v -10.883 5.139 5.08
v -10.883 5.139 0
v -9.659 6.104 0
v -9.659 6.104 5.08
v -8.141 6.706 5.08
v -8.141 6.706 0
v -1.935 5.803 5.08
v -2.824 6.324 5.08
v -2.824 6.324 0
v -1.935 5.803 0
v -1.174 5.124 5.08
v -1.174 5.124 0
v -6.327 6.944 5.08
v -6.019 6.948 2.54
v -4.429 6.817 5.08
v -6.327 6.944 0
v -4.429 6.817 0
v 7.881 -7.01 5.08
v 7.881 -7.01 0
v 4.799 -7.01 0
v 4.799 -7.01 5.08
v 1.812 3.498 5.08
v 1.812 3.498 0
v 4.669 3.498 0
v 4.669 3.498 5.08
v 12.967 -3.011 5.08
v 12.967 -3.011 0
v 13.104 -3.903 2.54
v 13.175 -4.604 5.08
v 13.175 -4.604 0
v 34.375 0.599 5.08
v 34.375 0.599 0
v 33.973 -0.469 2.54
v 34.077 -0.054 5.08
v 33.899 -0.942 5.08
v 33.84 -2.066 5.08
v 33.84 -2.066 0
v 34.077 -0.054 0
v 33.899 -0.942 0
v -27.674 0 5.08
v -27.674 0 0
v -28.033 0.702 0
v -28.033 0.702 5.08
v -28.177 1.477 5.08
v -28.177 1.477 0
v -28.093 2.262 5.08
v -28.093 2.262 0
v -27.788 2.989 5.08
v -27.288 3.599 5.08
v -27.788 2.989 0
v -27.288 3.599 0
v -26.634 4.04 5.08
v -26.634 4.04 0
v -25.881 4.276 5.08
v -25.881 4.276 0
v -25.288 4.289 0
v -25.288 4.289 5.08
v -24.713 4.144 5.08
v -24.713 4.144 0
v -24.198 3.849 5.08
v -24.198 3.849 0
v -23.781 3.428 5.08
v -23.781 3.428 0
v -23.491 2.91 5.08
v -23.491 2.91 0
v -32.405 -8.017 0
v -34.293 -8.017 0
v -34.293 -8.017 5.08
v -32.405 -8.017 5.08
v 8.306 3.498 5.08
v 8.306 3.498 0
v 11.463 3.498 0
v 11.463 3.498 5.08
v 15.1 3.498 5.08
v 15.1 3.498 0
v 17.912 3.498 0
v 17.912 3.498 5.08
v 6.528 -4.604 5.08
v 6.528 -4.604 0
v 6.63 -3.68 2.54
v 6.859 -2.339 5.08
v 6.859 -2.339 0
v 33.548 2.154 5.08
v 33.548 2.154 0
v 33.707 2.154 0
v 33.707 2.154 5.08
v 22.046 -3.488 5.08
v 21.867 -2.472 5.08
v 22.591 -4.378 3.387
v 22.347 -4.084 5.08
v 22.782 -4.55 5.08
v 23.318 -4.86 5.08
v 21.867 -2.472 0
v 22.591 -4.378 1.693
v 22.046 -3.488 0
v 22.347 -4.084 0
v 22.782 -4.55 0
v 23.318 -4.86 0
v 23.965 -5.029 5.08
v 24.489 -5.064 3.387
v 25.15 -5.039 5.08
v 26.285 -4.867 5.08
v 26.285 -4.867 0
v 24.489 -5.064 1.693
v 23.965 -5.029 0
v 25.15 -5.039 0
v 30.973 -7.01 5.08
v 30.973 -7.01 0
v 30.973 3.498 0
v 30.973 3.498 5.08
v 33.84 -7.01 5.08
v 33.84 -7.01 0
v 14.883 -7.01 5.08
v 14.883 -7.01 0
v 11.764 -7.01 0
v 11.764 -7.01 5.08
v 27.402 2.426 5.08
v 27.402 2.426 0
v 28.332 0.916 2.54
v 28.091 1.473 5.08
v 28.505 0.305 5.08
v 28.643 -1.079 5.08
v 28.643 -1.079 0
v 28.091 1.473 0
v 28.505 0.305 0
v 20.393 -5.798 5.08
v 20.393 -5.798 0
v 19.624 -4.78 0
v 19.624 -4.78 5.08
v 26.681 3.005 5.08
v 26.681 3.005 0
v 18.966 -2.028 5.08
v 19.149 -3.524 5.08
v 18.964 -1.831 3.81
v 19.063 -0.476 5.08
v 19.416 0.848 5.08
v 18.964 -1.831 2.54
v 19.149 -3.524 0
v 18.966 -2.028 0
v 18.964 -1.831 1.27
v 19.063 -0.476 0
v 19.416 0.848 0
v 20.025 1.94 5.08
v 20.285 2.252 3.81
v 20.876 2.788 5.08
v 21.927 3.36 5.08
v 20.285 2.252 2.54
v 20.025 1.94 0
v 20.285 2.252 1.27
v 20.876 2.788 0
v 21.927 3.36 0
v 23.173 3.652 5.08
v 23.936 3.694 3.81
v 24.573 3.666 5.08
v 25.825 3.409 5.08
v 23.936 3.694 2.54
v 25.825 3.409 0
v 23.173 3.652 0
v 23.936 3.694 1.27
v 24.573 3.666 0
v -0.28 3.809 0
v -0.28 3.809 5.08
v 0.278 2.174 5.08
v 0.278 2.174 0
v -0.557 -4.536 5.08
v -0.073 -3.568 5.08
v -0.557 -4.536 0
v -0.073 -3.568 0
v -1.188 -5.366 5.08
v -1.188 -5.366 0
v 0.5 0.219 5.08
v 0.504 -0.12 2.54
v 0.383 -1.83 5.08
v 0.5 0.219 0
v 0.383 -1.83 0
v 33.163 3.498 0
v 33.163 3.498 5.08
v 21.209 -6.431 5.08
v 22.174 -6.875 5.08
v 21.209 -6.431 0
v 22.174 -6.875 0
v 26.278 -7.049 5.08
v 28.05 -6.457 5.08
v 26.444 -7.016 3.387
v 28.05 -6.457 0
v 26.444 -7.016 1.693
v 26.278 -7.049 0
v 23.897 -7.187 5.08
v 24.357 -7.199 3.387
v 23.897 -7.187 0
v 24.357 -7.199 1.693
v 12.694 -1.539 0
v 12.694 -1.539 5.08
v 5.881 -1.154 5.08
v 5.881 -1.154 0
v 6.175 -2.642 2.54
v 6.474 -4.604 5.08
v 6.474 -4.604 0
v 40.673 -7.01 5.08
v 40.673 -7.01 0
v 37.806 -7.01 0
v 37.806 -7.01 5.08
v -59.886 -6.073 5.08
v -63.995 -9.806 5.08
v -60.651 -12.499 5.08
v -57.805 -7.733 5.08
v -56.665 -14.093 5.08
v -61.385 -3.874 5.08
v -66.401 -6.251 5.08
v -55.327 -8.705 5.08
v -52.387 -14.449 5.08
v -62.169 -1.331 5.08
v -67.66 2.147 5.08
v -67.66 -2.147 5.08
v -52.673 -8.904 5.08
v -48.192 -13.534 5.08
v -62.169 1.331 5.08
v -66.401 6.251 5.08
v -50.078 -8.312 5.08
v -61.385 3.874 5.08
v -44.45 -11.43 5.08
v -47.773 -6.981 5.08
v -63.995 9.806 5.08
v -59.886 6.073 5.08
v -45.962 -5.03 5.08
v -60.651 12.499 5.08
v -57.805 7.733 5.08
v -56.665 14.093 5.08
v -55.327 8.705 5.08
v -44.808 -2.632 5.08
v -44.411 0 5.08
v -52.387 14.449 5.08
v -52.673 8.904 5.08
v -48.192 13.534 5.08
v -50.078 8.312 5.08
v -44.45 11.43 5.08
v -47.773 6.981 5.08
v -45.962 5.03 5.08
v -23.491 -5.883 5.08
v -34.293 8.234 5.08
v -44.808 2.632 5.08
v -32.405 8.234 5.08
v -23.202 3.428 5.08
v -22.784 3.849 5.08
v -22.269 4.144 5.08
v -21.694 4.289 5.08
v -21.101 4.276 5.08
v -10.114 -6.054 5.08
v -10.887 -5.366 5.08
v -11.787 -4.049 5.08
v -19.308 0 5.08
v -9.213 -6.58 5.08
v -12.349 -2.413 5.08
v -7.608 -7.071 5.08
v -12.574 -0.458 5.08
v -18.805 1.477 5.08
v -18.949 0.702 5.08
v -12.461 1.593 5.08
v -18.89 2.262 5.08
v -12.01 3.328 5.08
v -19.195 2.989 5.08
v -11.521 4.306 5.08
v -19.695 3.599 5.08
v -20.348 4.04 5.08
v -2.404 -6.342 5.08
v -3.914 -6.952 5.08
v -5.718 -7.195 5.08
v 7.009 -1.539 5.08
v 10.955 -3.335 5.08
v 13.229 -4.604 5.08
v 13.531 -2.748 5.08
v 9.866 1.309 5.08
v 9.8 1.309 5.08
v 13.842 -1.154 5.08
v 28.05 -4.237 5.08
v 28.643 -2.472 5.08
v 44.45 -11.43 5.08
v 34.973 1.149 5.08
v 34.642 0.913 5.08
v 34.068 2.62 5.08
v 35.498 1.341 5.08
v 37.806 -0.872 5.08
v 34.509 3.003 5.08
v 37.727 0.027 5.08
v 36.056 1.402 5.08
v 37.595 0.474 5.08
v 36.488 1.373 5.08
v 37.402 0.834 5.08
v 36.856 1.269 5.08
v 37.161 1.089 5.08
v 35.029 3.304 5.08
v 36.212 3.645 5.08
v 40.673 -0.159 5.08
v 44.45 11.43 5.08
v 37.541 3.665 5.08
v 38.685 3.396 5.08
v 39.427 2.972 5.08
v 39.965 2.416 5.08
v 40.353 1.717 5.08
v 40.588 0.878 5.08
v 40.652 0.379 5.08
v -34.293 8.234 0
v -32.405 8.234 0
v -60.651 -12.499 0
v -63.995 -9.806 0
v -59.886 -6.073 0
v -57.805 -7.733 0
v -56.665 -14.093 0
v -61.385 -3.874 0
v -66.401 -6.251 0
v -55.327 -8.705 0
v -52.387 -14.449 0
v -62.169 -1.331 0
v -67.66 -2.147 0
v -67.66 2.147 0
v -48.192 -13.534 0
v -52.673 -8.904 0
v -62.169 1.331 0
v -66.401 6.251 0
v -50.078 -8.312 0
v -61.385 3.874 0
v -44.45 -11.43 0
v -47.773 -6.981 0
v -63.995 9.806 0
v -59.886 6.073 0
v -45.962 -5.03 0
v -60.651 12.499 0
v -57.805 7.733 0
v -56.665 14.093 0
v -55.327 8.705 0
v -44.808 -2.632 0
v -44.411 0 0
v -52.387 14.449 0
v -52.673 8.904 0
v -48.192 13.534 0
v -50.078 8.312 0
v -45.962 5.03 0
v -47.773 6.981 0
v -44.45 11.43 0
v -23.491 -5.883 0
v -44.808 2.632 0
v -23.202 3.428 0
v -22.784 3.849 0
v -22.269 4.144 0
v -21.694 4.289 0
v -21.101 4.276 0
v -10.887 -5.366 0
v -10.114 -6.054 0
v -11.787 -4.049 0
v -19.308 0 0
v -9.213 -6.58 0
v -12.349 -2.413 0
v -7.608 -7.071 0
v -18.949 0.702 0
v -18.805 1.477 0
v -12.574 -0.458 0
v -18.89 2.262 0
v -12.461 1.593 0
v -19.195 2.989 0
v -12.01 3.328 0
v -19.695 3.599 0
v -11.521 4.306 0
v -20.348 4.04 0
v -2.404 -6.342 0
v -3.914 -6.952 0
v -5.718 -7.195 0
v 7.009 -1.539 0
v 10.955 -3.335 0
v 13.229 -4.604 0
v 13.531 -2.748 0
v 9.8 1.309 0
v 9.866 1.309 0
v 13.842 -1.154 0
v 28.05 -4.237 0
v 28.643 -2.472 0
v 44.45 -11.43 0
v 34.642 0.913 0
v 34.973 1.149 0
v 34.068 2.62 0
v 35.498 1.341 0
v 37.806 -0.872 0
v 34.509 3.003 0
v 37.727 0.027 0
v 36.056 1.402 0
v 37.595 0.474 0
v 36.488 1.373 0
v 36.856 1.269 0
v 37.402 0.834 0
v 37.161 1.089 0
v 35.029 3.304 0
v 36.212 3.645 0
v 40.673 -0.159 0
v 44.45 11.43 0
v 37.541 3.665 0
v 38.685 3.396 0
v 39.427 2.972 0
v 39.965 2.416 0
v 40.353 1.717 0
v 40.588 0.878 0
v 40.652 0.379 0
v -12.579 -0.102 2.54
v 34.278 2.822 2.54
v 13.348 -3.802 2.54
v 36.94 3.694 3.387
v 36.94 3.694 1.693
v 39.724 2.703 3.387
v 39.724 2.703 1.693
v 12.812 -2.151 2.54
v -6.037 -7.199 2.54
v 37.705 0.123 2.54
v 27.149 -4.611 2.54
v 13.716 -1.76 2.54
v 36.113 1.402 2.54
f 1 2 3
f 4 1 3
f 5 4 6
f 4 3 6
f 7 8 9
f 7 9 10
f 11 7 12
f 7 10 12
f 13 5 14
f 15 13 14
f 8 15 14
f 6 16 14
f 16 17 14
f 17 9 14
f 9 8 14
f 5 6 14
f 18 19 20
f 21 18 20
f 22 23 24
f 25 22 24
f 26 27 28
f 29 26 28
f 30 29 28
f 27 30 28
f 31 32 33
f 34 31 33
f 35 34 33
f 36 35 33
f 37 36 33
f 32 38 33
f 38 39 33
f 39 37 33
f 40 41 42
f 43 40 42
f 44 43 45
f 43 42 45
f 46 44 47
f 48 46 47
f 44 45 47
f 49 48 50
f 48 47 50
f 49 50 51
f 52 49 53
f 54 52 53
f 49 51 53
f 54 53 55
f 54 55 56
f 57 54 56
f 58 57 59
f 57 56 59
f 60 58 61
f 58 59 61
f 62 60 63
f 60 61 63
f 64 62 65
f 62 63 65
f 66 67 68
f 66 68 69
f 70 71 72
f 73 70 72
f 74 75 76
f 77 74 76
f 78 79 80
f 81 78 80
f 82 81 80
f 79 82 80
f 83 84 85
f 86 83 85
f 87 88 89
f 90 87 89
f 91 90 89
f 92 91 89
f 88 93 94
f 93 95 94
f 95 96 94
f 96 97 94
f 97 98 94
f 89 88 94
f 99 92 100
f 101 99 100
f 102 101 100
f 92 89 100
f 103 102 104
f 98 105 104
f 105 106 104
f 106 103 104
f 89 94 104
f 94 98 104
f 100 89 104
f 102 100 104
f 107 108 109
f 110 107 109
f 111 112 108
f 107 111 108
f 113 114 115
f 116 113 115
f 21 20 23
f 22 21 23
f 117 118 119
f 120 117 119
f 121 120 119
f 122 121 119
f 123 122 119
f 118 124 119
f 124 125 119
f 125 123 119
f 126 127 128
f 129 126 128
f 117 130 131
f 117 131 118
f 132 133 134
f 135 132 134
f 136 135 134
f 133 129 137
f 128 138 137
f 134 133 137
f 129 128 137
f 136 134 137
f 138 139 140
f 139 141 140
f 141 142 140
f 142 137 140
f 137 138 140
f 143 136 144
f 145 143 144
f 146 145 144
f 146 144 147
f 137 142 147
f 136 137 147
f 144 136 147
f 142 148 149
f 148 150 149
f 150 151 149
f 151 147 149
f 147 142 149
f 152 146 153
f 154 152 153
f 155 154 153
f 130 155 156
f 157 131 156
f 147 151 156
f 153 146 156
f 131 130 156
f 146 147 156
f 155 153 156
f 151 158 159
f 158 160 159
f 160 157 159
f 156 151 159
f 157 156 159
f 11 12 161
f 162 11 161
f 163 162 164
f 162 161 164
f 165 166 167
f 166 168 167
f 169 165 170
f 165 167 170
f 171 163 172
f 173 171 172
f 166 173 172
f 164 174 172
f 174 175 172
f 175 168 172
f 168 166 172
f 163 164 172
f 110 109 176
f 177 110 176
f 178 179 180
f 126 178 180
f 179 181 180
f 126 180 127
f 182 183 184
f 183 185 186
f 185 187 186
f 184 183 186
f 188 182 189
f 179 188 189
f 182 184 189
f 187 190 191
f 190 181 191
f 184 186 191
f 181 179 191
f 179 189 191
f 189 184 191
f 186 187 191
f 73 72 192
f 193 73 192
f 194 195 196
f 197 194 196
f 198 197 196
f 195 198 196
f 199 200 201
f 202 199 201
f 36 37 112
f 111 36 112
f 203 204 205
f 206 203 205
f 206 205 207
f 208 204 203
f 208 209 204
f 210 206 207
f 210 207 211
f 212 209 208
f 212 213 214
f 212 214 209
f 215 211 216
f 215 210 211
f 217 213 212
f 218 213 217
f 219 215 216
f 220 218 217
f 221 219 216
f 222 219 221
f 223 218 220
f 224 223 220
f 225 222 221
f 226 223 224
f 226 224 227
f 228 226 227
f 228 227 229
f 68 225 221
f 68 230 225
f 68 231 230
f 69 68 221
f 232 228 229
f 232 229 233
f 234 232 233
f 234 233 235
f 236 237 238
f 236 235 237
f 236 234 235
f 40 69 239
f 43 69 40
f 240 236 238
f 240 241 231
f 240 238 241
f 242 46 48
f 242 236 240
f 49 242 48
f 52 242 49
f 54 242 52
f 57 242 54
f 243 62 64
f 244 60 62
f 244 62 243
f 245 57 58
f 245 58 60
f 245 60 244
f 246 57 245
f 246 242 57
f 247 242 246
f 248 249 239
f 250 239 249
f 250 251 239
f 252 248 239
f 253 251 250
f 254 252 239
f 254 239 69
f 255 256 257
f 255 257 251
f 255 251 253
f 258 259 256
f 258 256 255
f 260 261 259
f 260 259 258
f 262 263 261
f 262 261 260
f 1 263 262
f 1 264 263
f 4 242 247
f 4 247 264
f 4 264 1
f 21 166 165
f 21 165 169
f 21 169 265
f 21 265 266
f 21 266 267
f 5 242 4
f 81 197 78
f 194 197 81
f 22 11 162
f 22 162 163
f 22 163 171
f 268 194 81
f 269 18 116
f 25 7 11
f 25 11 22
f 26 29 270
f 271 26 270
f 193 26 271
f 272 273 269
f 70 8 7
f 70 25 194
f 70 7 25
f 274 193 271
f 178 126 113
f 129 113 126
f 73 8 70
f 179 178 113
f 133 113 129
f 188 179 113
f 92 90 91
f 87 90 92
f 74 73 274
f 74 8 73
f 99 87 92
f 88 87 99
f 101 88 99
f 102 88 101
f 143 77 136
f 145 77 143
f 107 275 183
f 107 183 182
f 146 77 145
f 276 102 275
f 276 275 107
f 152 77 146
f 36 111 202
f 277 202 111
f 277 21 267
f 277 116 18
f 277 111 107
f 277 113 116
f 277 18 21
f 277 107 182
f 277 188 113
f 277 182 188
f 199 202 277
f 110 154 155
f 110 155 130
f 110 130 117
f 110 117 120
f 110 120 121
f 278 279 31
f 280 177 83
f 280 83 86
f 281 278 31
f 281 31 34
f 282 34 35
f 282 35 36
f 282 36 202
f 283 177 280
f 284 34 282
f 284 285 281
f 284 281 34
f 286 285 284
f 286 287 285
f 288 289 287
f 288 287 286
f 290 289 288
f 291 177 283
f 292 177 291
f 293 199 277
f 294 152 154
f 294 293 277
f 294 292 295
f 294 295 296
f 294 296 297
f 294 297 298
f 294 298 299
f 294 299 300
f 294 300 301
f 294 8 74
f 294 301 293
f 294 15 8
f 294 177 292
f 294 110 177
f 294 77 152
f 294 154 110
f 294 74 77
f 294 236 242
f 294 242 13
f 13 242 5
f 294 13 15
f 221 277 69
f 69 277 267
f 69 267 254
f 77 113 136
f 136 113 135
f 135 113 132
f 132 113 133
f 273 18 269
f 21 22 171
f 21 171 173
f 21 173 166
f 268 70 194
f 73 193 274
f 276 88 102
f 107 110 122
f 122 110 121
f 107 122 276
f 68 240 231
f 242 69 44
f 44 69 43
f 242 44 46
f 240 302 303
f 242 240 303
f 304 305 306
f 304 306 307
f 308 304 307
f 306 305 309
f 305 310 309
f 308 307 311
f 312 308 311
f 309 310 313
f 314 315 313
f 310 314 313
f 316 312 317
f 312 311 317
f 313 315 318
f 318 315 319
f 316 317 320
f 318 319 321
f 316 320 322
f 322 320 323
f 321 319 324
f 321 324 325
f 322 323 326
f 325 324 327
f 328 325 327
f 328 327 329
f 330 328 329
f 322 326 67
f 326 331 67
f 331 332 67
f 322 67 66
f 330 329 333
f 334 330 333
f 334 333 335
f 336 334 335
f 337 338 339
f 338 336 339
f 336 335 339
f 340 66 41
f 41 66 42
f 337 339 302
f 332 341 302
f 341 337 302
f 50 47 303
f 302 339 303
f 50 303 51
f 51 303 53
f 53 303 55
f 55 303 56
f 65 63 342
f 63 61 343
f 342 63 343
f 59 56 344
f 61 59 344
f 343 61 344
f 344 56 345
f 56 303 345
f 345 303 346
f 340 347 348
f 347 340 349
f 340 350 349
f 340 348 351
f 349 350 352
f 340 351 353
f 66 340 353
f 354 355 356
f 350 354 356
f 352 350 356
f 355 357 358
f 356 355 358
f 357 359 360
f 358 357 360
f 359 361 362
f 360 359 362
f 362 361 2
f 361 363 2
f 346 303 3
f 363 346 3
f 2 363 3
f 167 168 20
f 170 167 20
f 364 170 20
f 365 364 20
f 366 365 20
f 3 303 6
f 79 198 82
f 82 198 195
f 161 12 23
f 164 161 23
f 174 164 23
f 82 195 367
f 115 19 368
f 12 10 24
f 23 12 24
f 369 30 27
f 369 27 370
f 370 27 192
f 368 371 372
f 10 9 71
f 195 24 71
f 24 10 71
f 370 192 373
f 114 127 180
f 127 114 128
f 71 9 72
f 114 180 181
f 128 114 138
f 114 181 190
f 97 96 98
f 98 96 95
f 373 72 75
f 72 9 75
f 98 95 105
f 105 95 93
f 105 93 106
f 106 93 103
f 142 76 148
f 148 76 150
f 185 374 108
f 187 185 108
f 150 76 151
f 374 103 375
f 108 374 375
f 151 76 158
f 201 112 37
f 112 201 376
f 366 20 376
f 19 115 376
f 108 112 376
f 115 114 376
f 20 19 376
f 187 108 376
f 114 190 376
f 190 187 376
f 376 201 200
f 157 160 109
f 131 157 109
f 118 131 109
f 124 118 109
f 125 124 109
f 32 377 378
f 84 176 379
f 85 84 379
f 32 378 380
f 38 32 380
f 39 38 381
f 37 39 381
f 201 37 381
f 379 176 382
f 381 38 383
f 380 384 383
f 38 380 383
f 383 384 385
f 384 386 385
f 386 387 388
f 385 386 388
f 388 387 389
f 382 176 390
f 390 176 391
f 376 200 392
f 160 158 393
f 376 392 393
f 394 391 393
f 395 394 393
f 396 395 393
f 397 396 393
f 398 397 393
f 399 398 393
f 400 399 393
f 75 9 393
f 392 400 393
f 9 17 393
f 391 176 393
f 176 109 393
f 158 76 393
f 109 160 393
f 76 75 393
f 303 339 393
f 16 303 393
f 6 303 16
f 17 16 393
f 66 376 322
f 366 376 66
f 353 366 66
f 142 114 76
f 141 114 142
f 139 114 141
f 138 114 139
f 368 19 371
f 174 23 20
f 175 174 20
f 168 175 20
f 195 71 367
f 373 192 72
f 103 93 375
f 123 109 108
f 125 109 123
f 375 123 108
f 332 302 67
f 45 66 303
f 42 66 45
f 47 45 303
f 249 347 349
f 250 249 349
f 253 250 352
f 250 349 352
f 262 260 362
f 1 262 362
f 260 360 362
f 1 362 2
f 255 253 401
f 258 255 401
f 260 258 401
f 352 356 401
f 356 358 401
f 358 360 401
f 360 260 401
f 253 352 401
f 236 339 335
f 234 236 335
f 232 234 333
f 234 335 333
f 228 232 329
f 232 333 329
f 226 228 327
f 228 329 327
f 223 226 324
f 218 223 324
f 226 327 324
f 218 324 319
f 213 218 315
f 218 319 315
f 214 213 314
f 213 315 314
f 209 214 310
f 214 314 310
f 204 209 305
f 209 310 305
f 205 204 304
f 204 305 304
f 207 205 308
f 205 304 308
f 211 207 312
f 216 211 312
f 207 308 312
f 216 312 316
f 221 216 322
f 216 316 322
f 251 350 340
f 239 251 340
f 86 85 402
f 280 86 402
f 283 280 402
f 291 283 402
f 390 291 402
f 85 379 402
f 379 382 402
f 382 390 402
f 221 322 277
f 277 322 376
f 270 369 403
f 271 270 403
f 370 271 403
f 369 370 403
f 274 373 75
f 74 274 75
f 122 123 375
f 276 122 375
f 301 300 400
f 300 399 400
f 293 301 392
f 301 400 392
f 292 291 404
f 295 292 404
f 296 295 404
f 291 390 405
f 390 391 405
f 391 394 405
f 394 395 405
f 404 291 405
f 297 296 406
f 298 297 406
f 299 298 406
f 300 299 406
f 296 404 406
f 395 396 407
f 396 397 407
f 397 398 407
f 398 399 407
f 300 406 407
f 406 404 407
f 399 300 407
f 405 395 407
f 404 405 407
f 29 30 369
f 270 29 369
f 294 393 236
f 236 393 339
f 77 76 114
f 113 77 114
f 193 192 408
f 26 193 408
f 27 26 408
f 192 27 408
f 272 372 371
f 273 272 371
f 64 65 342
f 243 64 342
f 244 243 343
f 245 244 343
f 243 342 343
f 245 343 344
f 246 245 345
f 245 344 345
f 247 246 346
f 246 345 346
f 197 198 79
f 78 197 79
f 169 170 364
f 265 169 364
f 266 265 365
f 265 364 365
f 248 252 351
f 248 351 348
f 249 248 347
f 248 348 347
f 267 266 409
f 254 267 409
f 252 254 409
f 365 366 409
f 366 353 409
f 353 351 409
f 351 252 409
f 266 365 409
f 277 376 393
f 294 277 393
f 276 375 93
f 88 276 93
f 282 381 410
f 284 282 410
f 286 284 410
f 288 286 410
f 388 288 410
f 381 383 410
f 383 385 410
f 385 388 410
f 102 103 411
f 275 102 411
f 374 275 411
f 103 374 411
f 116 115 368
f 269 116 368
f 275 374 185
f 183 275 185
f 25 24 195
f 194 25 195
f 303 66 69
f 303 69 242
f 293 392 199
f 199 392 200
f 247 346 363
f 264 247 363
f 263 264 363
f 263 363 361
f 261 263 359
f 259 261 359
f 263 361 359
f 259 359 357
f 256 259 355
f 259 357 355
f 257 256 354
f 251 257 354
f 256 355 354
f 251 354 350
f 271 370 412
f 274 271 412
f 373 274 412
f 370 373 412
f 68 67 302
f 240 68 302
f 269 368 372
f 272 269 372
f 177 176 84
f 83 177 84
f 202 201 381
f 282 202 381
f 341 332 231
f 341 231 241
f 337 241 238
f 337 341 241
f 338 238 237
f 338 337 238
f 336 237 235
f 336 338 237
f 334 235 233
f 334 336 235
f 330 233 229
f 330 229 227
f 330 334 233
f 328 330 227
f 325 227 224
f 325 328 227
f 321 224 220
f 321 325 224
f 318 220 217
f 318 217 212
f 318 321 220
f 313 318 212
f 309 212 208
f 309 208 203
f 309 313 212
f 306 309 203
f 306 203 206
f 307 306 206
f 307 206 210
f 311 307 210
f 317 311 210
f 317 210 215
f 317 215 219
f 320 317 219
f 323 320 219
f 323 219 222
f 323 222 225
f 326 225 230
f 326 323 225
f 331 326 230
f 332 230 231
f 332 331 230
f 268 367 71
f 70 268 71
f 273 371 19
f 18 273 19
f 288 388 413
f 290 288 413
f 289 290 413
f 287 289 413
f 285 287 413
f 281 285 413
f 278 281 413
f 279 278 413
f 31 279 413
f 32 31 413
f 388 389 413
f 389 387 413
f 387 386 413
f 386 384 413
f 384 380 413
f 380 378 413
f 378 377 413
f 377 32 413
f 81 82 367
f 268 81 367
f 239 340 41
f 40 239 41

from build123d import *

# Parameters (mm, degrees)
F0_R     = 8.9291855446
F0_W     = 1.8887050901
F0_H     = 16.251400295
F1_DEPTH = 5.08


with BuildPart() as f1:
    # F0 (on Top) → F1 (new body)
    with BuildSketch(Plane.XY):
        with BuildLine():
            Line((44.45, -11.43), (44.45, 11.43))
            Line((44.45, 11.43), (-44.45, 11.43))
            ThreePointArc((-44.45, 11.43), (-67.8202265578, 0), (-44.45, -11.43))
            Line((-44.45, -11.43), (44.45, -11.43))
        make_face()
        with BuildLine():
            Line((-19.3083044142, 0), (-23.491198197, -5.8829421178))
            Line((-23.491198197, -5.8829421178), (-27.6740919799, 0))
            ThreePointArc((-27.6740919799, 0), (-27.9666728456, 2.6362555137), (-25.8814226836, 4.2755170725))
            ThreePointArc((-25.8814226836, 4.2755170725), (-24.4455751804, 4.0138821459), (-23.491198197, 2.9096740764))
            ThreePointArc((-23.491198197, 2.9096740764), (-22.5368212136, 4.0138821459), (-21.1009737104, 4.2755170725))
            ThreePointArc((-21.1009737104, 4.2755170725), (-19.0157235484, 2.6362555137), (-19.3083044142, 0))
        make_face(mode=Mode.SUBTRACT)
        with BuildLine():
            add(Edge.make_bspline(
                [(-1.1741983702, 5.1239690358), (0.5040073817, 3.2998977303), (0.5040073817, -0.1196720545)],
                knots=[0, 0, 0, 1, 1, 1], degree=2))
            add(Edge.make_bspline(
                [(0.5040073817, -0.1196720545), (0.5040073817, -3.5332267649), (-1.1877322875, -5.366320682)],
                knots=[0, 0, 0, 1, 1, 1], degree=2))
            add(Edge.make_bspline(
                [(-1.1877322875, -5.366320682), (-2.8794719568, -7.1994145992), (-6.037386006, -7.1994145992)],
                knots=[0, 0, 0, 1, 1, 1], degree=2))
            add(Edge.make_bspline(
                [(-6.037386006, -7.1994145992), (-9.1953000553, -7.1994145992), (-10.8870397245, -5.366320682)],
                knots=[0, 0, 0, 1, 1, 1], degree=2))
            add(Edge.make_bspline(
                [(-10.8870397245, -5.366320682), (-12.5787793938, -3.5332267649), (-12.5787793938, -0.1016268314)],
                knots=[0, 0, 0, 1, 1, 1], degree=2))
            add(Edge.make_bspline(
                [(-12.5787793938, -0.1016268314), (-12.5787793938, 3.3299731022), (-10.8825284187, 5.1390067218)],
                knots=[0, 0, 0, 1, 1, 1], degree=2))
            add(Edge.make_bspline(
                [(-10.8825284187, 5.1390067218), (-9.1862774437, 6.9480403414), (-6.0193407829, 6.9480403414)],
                knots=[0, 0, 0, 1, 1, 1], degree=2))
            add(Edge.make_bspline(
                [(-6.0193407829, 6.9480403414), (-2.8524041221, 6.9480403414), (-1.1741983702, 5.1239690358)],
                knots=[0, 0, 0, 1, 1, 1], degree=2))
        make_face(mode=Mode.SUBTRACT)
        with BuildLine():
            Line((14.883042686, -7.0099397562), (11.7642266202, -7.0099397562))
            Line((11.7642266202, -7.0099397562), (10.9551991161, -3.3347293104))
            Line((10.9551991161, -3.3347293104), (9.8664706534, 1.3089081106))
            Line((9.8664706534, 1.3089081106), (9.8003048353, 1.3089081106))
            Line((9.8003048353, 1.3089081106), (7.8814961082, -7.0099397562))
            Line((7.8814961082, -7.0099397562), (4.7987704887, -7.0099397562))
            Line((4.7987704887, -7.0099397562), (1.8122860592, 3.4983951848))
            Line((1.8122860592, 3.4983951848), (4.6694463895, 3.4983951848))
            Line((4.6694463895, 3.4983951848), (5.881483877, -1.1542648478))
            add(Edge.make_bspline(
                [(5.881483877, -1.1542648478), (6.1732149844, -2.4054003187), (6.4739687034, -4.6039100044)],
                knots=[0, 0, 0, 1, 1, 1], degree=2))
            Line((6.4739687034, -4.6039100044), (6.5281043728, -4.6039100044))
            add(Edge.make_bspline(
                [(6.5281043728, -4.6039100044), (6.5672023563, -3.8881161533), (6.8589334637, -2.3392345005)],
                knots=[0, 0, 0, 1, 1, 1], degree=2))
            Line((6.8589334637, -2.3392345005), (7.0093103232, -1.5392296081))
            Line((7.0093103232, -1.5392296081), (8.3055588519, 3.4983951848))
            Line((8.3055588519, 3.4983951848), (11.4634729012, 3.4983951848))
            Line((11.4634729012, 3.4983951848), (12.6935556118, -1.5392296081))
            add(Edge.make_bspline(
                [(12.6935556118, -1.5392296081), (12.7326535953, -1.7467496742), (12.8123533308, -2.1512634262)],
                knots=[0, 0, 0, 1, 1, 1], degree=2))
            add(Edge.make_bspline(
                [(12.8123533308, -2.1512634262), (12.8920530663, -2.5557771782), (12.9672414961, -3.0114190625)],
                knots=[0, 0, 0, 1, 1, 1], degree=2))
            add(Edge.make_bspline(
                [(12.9672414961, -3.0114190625), (13.0424299258, -3.4670609467), (13.1040844382, -3.9031538392)],
                knots=[0, 0, 0, 1, 1, 1], degree=2))
            add(Edge.make_bspline(
                [(13.1040844382, -3.9031538392), (13.1657389506, -4.3392467317), (13.1747615622, -4.6039100044)],
                knots=[0, 0, 0, 1, 1, 1], degree=2))
            Line((13.1747615622, -4.6039100044), (13.2288972316, -4.6039100044))
            add(Edge.make_bspline(
                [(13.2288972316, -4.6039100044), (13.3161158101, -3.9272141367), (13.5311547192, -2.7482595584)],
                knots=[0, 0, 0, 1, 1, 1], degree=2))
            add(Edge.make_bspline(
                [(13.5311547192, -2.7482595584), (13.7461936282, -1.56930498), (13.8424348183, -1.1542648478)],
                knots=[0, 0, 0, 1, 1, 1], degree=2))
            Line((13.8424348183, -1.1542648478), (15.0995853636, 3.4983951848))
            Line((15.0995853636, 3.4983951848), (17.911632636, 3.4983951848))
            Line((17.911632636, 3.4983951848), (14.883042686, -7.0099397562))
        make_face(mode=Mode.SUBTRACT)
        with BuildLine():
            add(Edge.make_bspline(
                [(26.4440156434, -7.0159548306), (25.5898750815, -7.1994145992), (24.3567848337, -7.1994145992)],
                knots=[0, 0, 0, 1, 1, 1], degree=2))
            add(Edge.make_bspline(
                [(24.3567848337, -7.1994145992), (21.8214309827, -7.1994145992), (20.3928508176, -5.7979022688)],
                knots=[0, 0, 0, 1, 1, 1], degree=2))
            add(Edge.make_bspline(
                [(20.3928508176, -5.7979022688), (18.9642706525, -4.3963899383), (18.9642706525, -1.8309607155)],
                knots=[0, 0, 0, 1, 1, 1], degree=2))
            add(Edge.make_bspline(
                [(18.9642706525, -1.8309607155), (18.9642706525, 0.8096569371), (20.2845794788, 2.2517710196)],
                knots=[0, 0, 0, 1, 1, 1], degree=2))
            add(Edge.make_bspline(
                [(20.2845794788, 2.2517710196), (21.6048883051, 3.6938851021), (23.9357296271, 3.6938851021)],
                knots=[0, 0, 0, 1, 1, 1], degree=2))
            add(Edge.make_bspline(
                [(23.9357296271, 3.6938851021), (26.1613071476, 3.6938851021), (27.4019162383, 2.4262081766)],
                knots=[0, 0, 0, 1, 1, 1], degree=2))
            add(Edge.make_bspline(
                [(27.4019162383, 2.4262081766), (28.6425253291, 1.1585312511), (28.6425253291, -1.079076418)],
                knots=[0, 0, 0, 1, 1, 1], degree=2))
            Line((28.6425253291, -1.079076418), (28.6425253291, -2.4715661369))
            Line((28.6425253291, -2.4715661369), (21.8665440406, -2.4715661369))
            add(Edge.make_bspline(
                [(21.8665440406, -2.4715661369), (21.9146646356, -3.6926262359), (22.5913605033, -4.3783447152)],
                knots=[0, 0, 0, 1, 1, 1], degree=2))
            add(Edge.make_bspline(
                [(22.5913605033, -4.3783447152), (23.268056371, -5.0640631945), (24.48911647, -5.0640631945)],
                knots=[0, 0, 0, 1, 1, 1], degree=2))
            add(Edge.make_bspline(
                [(24.48911647, -5.0640631945), (25.439498222, -5.0640631945), (26.2846161723, -4.8670695085)],
                knots=[0, 0, 0, 1, 1, 1], degree=2))
            add(Edge.make_bspline(
                [(26.2846161723, -4.8670695085), (27.1297341227, -4.6700758226), (28.0500405027, -4.2369904673)],
                knots=[0, 0, 0, 1, 1, 1], degree=2))
            Line((28.0500405027, -4.2369904673), (28.0500405027, -6.4565529133))
            add(Edge.make_bspline(
                [(28.0500405027, -6.4565529133), (27.2981562053, -6.832495062), (26.4440156434, -7.0159548306)],
                knots=[0, 0, 0, 1, 1, 1], degree=2))
        make_face(mode=Mode.SUBTRACT)
        with BuildLine():
            Line((40.6726740882, -0.158770038), (40.6726740882, -7.0099397562))
            Line((40.6726740882, -7.0099397562), (37.8064911463, -7.0099397562))
            Line((37.8064911463, -7.0099397562), (37.8064911463, -0.8715563519))
            add(Edge.make_bspline(
                [(37.8064911463, -0.8715563519), (37.8064911463, 0.2652927058), (37.4019773943, 0.8337172347)],
                knots=[0, 0, 0, 1, 1, 1], degree=2))
            add(Edge.make_bspline(
                [(37.4019773943, 0.8337172347), (36.9974636423, 1.4021417635), (36.1132477085, 1.4021417635)],
                knots=[0, 0, 0, 1, 1, 1], degree=2))
            add(Edge.make_bspline(
                [(36.1132477085, 1.4021417635), (34.9102328326, 1.4021417635), (34.3748912128, 0.5991293339)],
                knots=[0, 0, 0, 1, 1, 1], degree=2))
            add(Edge.make_bspline(
                [(34.3748912128, 0.5991293339), (33.839549593, -0.2038830958), (33.839549593, -2.0655486163)],
                knots=[0, 0, 0, 1, 1, 1], degree=2))
            Line((33.839549593, -2.0655486163), (33.839549593, -7.0099397562))
            Line((33.839549593, -7.0099397562), (30.9733666512, -7.0099397562))
            Line((30.9733666512, -7.0099397562), (30.9733666512, 3.4983951848))
            Line((30.9733666512, 3.4983951848), (33.1628537253, 3.4983951848))
            Line((33.1628537253, 3.4983951848), (33.5478184856, 2.154026061))
            Line((33.5478184856, 2.154026061), (33.7072179567, 2.154026061))
            add(Edge.make_bspline(
                [(33.7072179567, 2.154026061), (34.188423907, 2.91493297), (35.0290305516, 3.304409036)],
                knots=[0, 0, 0, 1, 1, 1], degree=2))
            add(Edge.make_bspline(
                [(35.0290305516, 3.304409036), (35.8696371961, 3.6938851021), (36.9403204357, 3.6938851021)],
                knots=[0, 0, 0, 1, 1, 1], degree=2))
            add(Edge.make_bspline(
                [(36.9403204357, 3.6938851021), (38.7749181214, 3.6938851021), (39.7237961048, 2.7029015981)],
                knots=[0, 0, 0, 1, 1, 1], degree=2))
            add(Edge.make_bspline(
                [(39.7237961048, 2.7029015981), (40.6726740882, 1.7119180941), (40.6726740882, -0.158770038)],
                knots=[0, 0, 0, 1, 1, 1], degree=2))
        make_face(mode=Mode.SUBTRACT)
        with Locations((-53.3399991691, 0)):
            Circle(F0_R, mode=Mode.SUBTRACT)
        with Locations((-33.3491009139, 0.1086286247)):
            Rectangle(F0_W, F0_H, mode=Mode.SUBTRACT)
    extrude(amount=F1_DEPTH)


solid = f1.part
